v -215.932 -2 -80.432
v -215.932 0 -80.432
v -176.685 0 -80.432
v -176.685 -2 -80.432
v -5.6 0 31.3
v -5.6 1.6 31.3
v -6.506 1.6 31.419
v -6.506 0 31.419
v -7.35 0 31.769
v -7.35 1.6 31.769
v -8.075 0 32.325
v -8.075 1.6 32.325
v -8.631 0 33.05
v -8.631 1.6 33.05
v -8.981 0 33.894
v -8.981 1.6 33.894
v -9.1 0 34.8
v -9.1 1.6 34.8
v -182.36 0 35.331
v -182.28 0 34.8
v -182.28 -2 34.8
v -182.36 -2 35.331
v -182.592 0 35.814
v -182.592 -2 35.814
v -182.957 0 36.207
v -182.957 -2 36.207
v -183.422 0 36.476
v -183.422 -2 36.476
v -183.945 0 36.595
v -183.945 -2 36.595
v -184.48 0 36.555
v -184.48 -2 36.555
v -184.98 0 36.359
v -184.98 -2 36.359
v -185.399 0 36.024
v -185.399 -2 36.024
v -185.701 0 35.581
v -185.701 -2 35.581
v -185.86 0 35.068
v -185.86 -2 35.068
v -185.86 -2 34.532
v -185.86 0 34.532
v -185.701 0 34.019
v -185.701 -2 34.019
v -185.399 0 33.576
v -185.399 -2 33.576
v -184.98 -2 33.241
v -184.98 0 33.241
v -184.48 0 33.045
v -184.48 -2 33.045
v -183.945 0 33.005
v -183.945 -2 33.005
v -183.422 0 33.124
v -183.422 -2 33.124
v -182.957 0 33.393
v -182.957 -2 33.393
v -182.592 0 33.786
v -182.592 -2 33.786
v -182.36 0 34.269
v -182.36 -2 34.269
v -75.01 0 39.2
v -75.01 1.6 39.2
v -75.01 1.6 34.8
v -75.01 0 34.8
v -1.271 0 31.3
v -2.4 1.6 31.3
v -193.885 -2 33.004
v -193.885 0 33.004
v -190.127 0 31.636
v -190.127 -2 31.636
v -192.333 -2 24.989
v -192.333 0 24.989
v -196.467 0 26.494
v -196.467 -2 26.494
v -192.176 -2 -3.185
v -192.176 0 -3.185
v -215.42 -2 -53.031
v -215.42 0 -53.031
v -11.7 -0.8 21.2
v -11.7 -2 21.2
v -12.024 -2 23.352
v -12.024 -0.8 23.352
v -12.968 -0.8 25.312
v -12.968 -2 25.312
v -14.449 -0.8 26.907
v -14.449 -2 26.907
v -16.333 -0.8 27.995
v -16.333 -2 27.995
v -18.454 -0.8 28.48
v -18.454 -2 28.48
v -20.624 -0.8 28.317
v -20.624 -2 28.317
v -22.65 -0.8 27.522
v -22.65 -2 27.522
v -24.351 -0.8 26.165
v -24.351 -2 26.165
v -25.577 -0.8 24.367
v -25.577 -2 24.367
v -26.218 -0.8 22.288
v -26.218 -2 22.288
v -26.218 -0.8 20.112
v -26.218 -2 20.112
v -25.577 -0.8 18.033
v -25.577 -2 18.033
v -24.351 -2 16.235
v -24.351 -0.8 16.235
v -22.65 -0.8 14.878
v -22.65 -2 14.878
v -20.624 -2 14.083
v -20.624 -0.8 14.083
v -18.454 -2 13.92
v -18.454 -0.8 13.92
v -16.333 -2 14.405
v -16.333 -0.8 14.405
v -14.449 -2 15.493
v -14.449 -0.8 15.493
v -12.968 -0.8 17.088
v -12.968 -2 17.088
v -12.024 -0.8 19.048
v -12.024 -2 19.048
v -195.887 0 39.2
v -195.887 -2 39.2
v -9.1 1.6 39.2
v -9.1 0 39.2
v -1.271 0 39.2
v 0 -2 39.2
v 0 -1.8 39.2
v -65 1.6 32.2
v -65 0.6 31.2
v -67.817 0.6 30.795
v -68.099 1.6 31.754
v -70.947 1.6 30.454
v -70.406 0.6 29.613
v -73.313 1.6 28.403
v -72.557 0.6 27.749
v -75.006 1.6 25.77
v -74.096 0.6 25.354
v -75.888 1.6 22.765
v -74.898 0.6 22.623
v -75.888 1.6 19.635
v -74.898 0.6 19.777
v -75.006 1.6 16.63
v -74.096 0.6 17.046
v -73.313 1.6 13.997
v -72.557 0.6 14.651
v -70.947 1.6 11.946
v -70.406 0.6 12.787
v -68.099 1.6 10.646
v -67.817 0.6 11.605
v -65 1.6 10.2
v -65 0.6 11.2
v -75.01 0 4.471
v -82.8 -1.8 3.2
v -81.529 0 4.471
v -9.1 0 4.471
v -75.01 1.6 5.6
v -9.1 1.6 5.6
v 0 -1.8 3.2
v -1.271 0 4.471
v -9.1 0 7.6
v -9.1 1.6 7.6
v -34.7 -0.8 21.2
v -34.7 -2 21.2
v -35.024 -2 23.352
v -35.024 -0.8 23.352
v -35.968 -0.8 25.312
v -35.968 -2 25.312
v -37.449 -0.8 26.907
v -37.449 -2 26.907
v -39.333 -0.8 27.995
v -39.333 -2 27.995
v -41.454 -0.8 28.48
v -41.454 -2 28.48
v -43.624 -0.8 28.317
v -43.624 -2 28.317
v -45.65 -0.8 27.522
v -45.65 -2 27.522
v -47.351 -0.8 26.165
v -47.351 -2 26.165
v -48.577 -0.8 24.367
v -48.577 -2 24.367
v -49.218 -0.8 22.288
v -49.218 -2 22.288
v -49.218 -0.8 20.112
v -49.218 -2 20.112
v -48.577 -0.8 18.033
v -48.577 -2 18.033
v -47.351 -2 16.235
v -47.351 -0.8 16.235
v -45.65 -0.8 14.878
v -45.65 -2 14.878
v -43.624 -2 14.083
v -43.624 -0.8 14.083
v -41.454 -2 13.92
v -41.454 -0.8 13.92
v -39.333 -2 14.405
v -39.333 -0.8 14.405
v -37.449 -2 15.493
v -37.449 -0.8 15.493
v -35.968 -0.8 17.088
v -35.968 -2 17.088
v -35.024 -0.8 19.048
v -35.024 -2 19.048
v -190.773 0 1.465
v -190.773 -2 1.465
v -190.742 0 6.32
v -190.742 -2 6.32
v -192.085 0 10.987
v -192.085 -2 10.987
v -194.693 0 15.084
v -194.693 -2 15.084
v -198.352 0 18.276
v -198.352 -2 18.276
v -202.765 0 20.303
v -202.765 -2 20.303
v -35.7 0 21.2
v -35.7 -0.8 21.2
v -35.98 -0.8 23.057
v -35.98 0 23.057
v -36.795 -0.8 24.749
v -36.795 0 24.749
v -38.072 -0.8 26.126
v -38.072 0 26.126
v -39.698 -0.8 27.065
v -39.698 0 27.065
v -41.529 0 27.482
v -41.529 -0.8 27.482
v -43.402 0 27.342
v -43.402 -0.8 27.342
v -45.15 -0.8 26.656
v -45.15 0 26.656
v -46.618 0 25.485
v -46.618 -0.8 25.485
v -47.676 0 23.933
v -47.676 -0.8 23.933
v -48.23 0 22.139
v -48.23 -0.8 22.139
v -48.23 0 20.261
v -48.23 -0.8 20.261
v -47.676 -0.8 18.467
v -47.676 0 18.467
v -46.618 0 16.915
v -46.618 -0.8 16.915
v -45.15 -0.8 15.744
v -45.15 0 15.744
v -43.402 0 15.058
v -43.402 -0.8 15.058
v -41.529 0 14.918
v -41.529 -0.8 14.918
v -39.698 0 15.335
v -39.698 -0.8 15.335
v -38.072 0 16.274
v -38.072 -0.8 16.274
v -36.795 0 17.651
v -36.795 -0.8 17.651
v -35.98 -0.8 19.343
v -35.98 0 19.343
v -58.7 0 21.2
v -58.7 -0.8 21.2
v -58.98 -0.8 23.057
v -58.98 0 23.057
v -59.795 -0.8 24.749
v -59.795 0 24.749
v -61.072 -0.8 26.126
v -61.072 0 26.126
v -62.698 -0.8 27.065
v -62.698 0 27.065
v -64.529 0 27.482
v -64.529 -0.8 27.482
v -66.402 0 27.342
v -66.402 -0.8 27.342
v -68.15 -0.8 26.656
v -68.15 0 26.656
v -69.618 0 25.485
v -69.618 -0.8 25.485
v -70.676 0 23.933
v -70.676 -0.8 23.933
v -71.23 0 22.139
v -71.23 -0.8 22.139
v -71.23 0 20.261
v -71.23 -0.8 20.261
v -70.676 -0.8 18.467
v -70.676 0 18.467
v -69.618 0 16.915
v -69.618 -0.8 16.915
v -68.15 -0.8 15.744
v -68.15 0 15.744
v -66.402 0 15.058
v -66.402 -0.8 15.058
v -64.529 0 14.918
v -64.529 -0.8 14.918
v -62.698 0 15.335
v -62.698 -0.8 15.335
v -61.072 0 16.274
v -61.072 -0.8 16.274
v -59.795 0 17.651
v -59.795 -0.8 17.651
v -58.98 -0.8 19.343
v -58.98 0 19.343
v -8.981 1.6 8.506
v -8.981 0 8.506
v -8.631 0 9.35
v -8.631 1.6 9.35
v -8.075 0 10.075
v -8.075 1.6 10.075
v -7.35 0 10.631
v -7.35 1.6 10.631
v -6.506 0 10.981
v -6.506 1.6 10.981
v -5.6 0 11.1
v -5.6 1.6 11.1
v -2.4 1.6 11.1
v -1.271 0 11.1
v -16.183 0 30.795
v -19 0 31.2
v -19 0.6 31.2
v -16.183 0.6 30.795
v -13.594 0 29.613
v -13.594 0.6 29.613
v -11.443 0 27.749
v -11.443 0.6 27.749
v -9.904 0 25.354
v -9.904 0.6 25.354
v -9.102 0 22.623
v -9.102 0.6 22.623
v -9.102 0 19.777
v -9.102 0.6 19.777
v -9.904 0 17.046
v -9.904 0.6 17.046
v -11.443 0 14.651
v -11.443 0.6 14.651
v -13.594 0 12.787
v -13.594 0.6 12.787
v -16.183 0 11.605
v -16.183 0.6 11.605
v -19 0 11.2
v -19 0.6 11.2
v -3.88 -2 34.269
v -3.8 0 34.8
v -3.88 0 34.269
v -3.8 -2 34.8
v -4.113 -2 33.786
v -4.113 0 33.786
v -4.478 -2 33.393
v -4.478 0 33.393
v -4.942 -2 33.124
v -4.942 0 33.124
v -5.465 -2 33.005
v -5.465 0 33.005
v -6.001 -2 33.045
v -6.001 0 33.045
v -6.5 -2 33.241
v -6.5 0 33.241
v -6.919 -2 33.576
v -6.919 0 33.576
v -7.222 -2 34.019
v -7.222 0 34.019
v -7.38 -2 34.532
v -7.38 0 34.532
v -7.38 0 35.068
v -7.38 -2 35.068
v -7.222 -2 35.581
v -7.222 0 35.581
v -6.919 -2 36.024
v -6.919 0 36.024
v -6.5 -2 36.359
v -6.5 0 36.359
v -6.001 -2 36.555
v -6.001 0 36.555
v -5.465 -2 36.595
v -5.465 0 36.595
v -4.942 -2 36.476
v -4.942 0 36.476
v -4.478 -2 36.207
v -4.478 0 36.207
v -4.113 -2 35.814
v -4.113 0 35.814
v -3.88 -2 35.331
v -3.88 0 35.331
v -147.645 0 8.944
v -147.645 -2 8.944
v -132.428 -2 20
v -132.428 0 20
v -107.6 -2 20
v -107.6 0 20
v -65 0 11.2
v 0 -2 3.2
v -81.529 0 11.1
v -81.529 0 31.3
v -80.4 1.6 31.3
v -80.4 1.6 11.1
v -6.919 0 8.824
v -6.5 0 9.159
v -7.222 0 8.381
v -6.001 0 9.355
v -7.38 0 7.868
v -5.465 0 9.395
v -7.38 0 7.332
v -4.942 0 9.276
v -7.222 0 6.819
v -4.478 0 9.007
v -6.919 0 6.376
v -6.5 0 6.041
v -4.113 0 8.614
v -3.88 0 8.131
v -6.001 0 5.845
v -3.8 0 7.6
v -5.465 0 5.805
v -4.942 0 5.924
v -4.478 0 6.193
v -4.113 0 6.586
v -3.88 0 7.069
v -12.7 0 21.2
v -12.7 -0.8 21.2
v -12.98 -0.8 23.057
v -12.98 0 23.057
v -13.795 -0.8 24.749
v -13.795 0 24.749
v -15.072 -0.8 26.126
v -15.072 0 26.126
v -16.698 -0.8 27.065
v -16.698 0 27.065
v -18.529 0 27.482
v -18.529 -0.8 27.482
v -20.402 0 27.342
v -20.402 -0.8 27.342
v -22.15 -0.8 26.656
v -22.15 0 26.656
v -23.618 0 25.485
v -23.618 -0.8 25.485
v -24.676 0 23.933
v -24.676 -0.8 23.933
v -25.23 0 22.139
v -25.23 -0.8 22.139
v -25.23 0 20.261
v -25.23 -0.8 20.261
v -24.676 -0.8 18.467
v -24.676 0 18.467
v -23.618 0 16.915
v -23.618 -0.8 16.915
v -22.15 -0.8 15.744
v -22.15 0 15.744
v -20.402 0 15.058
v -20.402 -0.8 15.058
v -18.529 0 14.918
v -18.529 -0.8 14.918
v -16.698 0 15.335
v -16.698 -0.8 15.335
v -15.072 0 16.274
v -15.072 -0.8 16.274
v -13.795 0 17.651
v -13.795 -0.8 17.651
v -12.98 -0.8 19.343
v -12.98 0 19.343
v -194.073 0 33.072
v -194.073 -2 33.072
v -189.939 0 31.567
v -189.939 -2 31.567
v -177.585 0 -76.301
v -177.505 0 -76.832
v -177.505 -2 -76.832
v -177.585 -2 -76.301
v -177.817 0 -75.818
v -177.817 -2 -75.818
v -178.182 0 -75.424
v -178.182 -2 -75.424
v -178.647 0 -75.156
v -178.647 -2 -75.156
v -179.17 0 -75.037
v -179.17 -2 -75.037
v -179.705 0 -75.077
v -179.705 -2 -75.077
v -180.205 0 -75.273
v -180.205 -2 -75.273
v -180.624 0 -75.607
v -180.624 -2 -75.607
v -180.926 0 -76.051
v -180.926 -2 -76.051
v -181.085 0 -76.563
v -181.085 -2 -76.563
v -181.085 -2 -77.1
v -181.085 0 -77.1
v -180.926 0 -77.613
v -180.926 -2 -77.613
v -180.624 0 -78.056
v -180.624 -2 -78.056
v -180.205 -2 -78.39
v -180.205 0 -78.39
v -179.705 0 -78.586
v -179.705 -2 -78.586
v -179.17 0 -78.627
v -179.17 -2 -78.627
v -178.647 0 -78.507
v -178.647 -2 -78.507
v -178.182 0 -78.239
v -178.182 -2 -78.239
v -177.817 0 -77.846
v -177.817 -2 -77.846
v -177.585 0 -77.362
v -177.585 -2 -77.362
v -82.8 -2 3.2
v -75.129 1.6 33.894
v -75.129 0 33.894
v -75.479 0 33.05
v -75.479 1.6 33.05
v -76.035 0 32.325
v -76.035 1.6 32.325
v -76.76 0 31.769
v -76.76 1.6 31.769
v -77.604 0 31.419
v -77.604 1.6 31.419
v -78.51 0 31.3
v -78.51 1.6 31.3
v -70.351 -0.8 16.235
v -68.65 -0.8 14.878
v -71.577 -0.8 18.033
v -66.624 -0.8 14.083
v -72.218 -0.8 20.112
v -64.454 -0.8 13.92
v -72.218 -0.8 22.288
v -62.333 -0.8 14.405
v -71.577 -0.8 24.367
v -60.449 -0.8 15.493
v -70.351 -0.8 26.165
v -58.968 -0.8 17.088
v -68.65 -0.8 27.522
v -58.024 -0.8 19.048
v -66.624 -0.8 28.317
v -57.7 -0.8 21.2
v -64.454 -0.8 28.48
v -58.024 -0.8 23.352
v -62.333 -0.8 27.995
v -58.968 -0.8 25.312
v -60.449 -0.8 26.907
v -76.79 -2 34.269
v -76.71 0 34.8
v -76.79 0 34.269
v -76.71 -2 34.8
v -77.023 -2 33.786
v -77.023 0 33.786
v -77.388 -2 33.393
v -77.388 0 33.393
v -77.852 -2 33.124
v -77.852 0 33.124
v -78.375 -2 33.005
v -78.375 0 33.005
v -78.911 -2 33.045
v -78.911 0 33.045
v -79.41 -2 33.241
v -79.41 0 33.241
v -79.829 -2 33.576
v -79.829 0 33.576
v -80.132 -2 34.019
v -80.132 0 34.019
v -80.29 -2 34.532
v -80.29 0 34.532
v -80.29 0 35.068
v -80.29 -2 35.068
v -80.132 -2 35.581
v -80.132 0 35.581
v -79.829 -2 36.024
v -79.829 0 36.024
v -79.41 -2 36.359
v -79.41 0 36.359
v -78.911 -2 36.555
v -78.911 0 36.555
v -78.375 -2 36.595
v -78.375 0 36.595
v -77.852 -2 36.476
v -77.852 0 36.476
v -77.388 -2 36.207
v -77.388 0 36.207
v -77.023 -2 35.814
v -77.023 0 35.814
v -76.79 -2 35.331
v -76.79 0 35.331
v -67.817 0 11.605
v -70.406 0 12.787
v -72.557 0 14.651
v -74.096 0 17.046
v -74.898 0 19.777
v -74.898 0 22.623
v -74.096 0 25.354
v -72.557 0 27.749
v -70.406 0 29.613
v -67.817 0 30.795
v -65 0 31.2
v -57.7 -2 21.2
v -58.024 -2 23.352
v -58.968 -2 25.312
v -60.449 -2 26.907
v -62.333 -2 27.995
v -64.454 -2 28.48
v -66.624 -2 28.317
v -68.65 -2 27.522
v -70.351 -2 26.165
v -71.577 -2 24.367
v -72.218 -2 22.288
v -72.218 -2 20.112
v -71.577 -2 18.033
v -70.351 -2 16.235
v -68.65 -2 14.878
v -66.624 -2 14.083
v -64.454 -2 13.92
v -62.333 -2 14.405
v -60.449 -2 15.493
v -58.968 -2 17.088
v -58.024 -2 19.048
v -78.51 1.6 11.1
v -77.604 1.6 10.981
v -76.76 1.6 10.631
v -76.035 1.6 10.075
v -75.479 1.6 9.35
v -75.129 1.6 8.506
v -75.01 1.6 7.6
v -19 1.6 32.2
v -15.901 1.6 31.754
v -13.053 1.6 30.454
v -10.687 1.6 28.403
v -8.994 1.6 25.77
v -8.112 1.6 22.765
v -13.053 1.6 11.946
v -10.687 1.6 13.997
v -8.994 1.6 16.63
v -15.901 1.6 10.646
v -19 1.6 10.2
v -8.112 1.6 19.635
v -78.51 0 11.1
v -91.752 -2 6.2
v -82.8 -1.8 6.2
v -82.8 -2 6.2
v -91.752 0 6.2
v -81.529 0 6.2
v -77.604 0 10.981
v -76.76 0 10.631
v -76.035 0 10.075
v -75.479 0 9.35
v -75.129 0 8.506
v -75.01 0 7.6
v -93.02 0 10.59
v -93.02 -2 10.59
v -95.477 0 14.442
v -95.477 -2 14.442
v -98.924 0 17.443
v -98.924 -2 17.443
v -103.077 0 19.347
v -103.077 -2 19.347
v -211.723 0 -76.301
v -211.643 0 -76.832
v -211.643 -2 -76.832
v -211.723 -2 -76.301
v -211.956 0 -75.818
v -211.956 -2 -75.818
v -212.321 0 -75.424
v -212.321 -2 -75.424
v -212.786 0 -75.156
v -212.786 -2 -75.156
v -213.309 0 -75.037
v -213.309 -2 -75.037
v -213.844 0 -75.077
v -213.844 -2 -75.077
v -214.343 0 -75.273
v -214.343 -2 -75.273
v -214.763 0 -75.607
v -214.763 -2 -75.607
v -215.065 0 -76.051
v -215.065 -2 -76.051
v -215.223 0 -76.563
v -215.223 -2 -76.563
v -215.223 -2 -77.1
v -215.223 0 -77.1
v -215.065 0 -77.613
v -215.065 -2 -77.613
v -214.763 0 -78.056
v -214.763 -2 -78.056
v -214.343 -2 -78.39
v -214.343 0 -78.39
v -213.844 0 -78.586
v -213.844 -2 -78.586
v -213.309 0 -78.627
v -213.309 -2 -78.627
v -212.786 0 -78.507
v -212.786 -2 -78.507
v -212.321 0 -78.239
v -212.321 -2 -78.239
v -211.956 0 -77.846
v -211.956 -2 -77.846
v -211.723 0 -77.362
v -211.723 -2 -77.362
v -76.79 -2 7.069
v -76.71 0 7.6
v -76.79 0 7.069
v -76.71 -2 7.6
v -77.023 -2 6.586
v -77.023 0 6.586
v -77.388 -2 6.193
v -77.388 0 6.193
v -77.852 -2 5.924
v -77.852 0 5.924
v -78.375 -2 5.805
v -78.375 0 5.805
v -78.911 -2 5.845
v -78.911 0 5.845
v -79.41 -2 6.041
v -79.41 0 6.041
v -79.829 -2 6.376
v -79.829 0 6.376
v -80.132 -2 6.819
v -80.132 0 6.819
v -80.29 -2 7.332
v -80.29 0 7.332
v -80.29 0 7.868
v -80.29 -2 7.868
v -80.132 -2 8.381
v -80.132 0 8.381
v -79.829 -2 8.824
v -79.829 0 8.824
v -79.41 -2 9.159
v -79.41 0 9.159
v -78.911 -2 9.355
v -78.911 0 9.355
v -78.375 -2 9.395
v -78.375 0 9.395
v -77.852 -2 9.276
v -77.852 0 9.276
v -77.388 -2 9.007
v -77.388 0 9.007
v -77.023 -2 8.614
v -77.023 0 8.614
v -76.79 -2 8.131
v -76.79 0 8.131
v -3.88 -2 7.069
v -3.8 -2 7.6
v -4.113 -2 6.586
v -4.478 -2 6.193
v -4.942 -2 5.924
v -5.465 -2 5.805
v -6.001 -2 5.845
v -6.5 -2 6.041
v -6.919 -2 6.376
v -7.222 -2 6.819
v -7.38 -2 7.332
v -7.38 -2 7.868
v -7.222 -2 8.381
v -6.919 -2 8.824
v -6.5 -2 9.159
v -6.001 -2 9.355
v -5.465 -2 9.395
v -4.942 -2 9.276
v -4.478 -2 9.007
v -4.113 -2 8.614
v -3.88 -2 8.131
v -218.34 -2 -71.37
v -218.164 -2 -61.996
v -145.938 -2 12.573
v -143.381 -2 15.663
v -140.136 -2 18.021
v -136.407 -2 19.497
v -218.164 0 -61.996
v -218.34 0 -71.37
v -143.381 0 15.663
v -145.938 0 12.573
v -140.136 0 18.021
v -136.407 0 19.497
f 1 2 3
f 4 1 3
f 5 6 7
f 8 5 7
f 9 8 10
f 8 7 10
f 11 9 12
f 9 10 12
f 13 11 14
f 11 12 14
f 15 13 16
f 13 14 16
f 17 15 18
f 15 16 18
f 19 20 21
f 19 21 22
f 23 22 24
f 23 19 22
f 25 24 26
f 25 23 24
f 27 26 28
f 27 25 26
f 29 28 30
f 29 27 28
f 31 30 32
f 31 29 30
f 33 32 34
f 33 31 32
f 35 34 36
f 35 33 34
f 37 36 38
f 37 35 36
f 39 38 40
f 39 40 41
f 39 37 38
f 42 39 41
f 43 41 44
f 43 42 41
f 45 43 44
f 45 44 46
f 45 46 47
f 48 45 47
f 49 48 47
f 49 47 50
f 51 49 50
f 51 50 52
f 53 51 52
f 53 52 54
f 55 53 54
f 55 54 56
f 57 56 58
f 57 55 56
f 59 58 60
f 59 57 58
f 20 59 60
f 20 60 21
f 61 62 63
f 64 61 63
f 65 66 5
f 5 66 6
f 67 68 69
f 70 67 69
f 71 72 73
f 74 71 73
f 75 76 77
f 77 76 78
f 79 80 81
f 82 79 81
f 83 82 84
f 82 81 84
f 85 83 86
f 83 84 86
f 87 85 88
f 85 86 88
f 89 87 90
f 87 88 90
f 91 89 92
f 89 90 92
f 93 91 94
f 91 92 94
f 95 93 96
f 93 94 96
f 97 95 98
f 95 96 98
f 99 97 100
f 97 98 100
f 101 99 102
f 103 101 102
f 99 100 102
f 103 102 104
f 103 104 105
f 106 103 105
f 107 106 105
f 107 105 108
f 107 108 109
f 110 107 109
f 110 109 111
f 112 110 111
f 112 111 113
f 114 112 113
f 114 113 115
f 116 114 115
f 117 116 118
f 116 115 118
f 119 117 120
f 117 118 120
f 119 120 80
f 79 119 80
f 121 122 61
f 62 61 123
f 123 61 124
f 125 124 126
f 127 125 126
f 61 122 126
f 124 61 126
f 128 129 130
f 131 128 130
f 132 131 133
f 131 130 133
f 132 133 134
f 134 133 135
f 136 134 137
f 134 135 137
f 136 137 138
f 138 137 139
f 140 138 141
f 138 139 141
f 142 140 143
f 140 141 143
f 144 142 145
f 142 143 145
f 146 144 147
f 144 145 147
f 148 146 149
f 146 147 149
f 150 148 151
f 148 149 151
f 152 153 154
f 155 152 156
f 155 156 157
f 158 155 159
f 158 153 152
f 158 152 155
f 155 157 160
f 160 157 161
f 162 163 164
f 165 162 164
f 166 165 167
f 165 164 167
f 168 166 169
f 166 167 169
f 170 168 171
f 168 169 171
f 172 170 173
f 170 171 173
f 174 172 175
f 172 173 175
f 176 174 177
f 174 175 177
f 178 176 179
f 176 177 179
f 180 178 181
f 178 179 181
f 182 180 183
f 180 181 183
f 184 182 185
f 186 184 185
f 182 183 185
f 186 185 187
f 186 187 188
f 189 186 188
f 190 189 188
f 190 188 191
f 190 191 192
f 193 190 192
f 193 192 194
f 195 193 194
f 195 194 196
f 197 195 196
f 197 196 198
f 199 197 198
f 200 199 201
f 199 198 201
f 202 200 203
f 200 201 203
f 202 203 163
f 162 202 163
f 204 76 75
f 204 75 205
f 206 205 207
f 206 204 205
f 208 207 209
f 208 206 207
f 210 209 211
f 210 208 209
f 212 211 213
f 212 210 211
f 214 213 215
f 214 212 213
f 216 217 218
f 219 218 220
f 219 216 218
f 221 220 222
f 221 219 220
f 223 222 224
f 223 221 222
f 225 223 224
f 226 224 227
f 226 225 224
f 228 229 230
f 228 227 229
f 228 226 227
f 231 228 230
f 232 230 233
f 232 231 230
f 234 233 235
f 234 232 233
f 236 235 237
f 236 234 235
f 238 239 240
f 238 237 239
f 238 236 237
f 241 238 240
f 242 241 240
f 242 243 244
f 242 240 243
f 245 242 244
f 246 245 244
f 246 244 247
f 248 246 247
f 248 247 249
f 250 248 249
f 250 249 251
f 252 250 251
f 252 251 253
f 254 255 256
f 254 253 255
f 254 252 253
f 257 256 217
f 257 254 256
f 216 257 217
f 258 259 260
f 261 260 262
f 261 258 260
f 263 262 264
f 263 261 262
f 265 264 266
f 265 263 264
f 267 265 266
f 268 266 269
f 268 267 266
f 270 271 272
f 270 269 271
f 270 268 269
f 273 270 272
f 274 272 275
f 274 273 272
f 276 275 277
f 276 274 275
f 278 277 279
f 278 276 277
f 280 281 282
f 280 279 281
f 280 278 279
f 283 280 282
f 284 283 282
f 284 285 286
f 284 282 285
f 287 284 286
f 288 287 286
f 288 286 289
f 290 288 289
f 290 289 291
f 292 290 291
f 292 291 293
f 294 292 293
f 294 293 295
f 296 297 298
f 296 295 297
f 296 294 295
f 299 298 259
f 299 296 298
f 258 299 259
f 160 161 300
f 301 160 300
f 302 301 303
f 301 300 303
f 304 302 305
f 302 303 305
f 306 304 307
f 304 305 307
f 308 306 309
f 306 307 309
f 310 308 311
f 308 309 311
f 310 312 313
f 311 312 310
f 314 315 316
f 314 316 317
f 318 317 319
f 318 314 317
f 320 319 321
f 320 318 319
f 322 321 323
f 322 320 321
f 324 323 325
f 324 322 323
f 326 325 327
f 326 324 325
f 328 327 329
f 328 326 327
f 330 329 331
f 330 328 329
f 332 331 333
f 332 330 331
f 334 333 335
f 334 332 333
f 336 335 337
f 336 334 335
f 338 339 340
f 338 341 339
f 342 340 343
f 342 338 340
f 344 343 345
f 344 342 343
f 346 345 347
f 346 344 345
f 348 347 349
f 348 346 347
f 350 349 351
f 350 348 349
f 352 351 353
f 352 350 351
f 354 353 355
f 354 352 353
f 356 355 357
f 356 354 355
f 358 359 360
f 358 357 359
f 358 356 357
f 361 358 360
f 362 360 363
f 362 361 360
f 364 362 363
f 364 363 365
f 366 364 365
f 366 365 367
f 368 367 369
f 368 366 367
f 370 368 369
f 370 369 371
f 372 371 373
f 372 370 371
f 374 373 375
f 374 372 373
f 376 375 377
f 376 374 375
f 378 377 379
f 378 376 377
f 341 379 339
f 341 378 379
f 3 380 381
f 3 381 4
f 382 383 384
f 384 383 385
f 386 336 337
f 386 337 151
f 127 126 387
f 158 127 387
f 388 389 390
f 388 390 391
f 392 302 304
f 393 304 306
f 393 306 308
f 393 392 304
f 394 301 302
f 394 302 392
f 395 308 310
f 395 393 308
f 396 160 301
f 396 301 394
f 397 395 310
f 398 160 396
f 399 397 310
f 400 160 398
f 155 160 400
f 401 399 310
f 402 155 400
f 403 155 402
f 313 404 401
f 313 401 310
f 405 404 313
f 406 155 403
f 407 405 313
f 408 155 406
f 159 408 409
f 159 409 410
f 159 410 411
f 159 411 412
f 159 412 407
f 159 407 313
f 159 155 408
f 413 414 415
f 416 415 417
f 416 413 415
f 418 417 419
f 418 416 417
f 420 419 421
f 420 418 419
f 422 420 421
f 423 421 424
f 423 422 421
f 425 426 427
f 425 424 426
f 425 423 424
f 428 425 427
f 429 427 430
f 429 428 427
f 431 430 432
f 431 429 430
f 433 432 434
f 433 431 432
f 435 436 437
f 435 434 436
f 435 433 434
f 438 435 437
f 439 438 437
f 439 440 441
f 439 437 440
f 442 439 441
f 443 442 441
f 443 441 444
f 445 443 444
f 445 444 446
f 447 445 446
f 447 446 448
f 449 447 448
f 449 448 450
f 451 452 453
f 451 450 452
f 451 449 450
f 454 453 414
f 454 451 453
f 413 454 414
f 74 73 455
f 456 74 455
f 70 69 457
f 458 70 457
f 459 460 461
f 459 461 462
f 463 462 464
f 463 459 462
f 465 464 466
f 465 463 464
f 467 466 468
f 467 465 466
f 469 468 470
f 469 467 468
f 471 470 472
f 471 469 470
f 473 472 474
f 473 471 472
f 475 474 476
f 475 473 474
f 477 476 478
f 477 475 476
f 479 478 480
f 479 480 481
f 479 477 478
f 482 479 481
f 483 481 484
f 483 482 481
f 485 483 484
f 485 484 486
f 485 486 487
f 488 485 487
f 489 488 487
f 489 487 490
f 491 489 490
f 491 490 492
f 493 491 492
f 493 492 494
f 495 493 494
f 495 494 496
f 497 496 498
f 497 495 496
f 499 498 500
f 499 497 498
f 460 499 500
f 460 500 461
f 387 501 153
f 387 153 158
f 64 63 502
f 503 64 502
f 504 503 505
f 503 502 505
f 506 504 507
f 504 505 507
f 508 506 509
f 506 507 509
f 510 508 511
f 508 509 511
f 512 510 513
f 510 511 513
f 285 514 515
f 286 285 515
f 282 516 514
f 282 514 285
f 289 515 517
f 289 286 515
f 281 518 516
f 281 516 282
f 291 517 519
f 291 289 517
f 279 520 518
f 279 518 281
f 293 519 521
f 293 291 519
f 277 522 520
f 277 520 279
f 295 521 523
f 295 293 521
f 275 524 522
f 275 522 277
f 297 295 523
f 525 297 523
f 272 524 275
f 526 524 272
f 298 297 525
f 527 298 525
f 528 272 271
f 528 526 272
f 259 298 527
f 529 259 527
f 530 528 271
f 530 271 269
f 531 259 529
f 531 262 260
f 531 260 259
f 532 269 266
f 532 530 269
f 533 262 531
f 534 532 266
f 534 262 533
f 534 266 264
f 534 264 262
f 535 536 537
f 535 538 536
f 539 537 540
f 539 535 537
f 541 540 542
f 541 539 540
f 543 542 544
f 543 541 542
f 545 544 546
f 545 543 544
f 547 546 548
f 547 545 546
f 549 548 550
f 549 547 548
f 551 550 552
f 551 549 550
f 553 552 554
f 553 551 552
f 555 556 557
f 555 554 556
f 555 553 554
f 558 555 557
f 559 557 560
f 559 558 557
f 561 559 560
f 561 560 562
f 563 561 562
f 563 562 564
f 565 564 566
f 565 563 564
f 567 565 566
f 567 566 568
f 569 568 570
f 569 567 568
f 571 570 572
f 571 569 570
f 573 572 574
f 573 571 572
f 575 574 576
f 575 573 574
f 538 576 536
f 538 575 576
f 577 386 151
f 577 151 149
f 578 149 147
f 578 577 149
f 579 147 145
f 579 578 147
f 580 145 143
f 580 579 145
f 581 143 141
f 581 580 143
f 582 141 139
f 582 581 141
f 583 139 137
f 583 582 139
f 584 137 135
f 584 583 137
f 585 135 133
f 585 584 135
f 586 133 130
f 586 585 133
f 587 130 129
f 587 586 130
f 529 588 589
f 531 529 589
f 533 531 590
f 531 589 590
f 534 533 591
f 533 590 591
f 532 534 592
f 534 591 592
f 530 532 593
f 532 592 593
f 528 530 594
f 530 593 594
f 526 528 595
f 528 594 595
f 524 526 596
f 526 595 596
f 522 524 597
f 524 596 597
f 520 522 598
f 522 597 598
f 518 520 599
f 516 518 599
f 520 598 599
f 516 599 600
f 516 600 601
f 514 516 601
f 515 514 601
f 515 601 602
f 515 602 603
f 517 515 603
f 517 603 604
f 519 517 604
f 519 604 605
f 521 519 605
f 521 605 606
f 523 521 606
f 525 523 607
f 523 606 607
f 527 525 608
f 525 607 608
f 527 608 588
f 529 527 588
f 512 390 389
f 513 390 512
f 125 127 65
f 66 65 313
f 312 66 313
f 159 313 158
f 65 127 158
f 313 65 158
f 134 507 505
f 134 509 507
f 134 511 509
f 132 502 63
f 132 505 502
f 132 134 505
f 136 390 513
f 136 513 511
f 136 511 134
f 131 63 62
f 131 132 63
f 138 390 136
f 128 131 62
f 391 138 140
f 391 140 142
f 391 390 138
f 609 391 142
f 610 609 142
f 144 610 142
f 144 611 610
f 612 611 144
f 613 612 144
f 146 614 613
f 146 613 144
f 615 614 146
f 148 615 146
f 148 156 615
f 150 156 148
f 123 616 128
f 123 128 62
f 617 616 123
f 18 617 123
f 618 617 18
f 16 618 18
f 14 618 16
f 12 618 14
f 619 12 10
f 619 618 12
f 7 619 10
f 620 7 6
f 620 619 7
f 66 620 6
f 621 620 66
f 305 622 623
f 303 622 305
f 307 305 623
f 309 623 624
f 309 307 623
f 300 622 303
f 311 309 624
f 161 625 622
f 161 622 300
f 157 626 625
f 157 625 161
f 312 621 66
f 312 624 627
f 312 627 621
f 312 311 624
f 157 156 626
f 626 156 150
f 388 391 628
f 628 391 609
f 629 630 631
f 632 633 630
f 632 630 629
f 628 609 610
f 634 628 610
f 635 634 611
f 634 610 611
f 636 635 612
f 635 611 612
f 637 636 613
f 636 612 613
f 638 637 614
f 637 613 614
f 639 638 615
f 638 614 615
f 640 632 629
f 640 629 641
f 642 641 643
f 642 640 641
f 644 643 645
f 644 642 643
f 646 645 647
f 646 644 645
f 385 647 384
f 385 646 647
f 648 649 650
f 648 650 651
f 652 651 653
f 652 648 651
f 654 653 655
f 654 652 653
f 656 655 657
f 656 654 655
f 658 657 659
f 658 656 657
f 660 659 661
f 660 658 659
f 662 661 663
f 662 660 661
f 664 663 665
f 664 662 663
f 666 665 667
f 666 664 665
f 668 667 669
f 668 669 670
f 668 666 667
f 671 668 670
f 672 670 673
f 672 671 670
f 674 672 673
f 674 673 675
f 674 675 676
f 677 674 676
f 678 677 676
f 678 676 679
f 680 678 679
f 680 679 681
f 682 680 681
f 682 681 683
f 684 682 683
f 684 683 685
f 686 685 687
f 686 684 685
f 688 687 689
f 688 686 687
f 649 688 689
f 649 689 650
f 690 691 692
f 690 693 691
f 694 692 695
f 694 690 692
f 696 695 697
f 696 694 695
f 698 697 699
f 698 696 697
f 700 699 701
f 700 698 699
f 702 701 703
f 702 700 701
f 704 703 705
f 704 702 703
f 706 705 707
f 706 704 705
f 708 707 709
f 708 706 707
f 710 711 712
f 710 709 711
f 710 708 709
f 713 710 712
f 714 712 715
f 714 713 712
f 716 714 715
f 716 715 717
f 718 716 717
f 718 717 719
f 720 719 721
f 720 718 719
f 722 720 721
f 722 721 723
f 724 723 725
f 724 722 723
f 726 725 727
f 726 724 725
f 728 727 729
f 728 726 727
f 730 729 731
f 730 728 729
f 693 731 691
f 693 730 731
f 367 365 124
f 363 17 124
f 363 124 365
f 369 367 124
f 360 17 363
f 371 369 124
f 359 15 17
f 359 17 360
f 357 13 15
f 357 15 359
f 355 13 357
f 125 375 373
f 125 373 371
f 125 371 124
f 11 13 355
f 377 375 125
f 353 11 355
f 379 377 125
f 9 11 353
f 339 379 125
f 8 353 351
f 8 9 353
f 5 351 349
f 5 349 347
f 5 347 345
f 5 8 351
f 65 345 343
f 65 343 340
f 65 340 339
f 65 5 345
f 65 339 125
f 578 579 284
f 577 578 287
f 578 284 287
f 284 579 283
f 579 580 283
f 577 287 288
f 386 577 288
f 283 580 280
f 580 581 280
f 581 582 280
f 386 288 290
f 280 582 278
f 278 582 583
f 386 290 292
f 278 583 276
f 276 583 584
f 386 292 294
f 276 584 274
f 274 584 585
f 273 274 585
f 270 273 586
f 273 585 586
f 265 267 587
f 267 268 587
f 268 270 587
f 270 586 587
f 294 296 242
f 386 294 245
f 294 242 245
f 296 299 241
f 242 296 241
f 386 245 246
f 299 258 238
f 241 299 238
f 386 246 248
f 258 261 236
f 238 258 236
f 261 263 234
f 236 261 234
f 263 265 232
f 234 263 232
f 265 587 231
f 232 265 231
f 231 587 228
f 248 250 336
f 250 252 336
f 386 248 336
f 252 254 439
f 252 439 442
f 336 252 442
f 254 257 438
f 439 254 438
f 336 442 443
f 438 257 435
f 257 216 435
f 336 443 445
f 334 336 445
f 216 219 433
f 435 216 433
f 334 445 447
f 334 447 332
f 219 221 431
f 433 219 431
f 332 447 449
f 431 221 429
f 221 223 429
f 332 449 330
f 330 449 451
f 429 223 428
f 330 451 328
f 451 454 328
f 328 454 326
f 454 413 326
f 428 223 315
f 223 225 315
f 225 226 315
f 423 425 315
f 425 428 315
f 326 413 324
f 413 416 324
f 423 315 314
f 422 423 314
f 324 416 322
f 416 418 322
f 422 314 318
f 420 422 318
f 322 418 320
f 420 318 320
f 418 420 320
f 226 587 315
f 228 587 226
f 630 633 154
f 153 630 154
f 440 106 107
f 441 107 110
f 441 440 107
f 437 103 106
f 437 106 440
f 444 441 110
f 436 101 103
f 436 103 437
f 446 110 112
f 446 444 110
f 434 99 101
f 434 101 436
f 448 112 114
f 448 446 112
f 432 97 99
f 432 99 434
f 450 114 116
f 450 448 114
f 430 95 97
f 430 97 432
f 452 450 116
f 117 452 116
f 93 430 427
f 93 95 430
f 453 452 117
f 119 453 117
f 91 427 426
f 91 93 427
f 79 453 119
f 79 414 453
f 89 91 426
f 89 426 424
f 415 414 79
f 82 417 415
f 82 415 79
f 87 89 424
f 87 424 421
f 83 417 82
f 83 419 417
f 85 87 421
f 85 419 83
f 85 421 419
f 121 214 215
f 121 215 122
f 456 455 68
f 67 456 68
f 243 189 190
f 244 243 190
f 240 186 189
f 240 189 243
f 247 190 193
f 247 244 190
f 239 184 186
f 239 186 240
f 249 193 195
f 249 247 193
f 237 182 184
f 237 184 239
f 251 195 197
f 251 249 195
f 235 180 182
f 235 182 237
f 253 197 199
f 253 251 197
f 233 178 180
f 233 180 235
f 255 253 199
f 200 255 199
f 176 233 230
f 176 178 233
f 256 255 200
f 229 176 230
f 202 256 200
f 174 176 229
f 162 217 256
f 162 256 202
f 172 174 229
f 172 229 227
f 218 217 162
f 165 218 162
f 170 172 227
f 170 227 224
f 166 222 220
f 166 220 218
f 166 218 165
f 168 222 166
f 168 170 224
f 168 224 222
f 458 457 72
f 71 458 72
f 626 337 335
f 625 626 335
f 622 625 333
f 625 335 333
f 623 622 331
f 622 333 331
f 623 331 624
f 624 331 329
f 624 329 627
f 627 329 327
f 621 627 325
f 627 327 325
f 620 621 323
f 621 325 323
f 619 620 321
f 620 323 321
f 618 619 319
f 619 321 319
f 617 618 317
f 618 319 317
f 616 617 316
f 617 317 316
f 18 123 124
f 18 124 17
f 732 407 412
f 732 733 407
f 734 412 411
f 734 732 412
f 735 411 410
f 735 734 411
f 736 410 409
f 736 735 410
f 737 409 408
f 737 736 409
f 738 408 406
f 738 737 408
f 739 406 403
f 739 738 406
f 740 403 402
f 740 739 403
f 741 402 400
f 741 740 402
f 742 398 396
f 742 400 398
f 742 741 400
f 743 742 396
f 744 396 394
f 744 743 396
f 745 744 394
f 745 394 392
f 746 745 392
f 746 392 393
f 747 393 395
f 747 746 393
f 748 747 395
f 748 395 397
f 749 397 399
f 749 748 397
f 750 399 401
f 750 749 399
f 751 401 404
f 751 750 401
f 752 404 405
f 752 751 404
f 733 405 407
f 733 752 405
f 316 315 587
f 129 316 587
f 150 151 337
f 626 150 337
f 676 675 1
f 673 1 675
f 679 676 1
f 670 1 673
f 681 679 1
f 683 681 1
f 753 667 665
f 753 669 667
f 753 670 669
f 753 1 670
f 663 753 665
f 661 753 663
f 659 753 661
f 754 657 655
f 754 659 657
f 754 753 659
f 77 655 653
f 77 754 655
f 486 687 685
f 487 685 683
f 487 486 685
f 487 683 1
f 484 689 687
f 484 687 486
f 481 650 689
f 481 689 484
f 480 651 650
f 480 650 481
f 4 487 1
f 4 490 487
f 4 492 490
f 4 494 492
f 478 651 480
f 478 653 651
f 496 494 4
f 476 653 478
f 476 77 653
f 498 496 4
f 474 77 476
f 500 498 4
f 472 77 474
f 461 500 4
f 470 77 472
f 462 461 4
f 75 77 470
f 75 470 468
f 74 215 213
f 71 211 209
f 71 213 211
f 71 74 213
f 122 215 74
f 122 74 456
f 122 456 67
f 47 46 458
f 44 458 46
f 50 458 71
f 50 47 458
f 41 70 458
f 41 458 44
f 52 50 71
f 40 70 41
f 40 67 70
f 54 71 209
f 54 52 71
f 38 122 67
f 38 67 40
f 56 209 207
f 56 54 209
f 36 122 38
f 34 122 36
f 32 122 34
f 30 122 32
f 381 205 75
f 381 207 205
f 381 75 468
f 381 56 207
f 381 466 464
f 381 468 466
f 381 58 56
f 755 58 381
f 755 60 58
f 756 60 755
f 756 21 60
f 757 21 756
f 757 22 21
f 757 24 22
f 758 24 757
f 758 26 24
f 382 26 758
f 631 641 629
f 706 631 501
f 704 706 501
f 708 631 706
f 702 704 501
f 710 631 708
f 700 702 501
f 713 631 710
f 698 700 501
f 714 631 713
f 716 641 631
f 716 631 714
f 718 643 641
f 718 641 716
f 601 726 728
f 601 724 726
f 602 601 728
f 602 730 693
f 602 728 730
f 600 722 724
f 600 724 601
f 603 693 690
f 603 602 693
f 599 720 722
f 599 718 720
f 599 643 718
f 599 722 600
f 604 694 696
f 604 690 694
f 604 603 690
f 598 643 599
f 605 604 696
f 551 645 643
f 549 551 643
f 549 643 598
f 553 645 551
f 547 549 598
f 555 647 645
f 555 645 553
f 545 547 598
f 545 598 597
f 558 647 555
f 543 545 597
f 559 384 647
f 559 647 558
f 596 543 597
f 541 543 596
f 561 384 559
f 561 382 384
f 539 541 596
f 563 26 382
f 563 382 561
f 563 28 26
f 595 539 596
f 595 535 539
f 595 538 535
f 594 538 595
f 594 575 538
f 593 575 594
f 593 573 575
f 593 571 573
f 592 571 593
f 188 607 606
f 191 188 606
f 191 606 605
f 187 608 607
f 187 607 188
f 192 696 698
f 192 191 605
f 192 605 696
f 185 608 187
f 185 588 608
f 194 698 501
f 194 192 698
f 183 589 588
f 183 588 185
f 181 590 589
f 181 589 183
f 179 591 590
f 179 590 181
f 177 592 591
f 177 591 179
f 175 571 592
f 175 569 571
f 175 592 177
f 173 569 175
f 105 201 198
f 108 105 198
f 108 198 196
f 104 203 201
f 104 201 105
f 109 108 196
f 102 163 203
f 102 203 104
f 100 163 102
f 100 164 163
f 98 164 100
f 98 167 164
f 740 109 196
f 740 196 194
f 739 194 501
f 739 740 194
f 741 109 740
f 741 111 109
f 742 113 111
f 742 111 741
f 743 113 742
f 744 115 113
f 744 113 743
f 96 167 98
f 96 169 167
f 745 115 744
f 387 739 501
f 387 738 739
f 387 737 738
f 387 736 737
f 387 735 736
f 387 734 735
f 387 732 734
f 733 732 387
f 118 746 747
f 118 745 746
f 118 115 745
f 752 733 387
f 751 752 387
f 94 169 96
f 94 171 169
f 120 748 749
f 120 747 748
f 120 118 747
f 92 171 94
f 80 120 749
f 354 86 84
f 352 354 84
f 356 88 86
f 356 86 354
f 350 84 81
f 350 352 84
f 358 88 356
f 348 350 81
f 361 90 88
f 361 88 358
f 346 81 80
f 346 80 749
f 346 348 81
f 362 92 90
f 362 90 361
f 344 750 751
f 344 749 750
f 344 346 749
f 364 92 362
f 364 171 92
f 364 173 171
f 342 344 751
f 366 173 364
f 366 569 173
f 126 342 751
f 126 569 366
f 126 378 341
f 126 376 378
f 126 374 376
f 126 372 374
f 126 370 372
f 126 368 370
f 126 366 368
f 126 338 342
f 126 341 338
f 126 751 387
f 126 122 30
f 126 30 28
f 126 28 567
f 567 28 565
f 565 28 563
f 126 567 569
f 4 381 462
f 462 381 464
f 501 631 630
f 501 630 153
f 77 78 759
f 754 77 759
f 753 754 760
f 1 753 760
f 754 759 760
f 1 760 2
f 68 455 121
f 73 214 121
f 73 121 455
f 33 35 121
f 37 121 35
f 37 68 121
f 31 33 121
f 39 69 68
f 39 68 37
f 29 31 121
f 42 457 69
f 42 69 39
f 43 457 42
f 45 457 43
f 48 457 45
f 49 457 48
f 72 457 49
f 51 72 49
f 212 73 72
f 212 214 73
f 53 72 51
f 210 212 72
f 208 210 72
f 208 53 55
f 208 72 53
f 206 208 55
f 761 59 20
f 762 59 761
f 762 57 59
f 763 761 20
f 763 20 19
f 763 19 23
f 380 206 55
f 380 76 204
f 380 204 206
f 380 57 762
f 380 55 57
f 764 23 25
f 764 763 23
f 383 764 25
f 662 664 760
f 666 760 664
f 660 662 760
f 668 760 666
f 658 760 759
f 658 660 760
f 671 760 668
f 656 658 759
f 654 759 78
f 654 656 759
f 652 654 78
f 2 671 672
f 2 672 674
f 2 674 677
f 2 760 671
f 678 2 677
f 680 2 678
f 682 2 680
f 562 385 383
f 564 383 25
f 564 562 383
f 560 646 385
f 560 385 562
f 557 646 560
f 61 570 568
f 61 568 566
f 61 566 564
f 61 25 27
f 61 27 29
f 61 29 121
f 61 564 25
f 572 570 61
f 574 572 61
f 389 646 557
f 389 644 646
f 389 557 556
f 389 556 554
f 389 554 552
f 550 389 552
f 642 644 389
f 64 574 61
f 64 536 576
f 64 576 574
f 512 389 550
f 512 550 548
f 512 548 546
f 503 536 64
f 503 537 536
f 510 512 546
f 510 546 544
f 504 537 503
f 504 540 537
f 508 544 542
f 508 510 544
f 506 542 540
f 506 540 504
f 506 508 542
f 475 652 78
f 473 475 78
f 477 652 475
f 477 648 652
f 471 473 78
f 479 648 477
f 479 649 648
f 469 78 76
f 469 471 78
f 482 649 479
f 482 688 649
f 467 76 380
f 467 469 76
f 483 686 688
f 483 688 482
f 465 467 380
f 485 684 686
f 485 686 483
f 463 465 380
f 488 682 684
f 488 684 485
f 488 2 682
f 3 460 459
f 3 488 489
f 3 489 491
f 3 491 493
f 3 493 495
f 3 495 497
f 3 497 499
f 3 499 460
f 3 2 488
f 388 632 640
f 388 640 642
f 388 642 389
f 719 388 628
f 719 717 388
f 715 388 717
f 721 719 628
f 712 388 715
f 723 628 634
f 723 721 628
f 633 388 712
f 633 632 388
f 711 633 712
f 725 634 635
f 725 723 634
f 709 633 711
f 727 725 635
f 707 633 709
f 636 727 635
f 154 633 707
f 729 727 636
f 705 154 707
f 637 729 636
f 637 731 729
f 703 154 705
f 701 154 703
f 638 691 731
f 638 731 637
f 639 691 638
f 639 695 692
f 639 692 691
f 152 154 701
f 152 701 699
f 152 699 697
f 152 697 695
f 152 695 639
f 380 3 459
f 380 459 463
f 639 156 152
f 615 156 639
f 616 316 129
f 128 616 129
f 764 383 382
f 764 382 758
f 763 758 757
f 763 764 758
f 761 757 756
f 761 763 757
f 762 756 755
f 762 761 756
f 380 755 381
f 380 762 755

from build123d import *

# Parameters (mm, degrees)
SKETCH074_R      = 1.8
SKETCH074_R_2    = 6.3
PAD004_DEPTH     = 2
SKETCH091_R      = 7.3
POCKET001_DEPTH  = 1.2
SKETCH092_W      = 82.8
SKETCH092_H      = 36
SKETCH092_R      = 1.8
PAD005_DEPTH     = 1.6
CHAMFER001_SIZE2 = 3.4
CHAMFER001_SIZE  = 2.4
POCKET002_DEPTH  = 1.6
CHAMFER002_SIZE  = 1


with BuildPart() as part:
    # Sketch074 → Pad004 (new body)
    with BuildSketch(Plane.XZ):
        with BuildLine():
            Line((-82.8, 3.2), (0, 3.2))
            Line((0, 3.2), (0, 39.2))
            Line((-195.886839, 39.2), (0, 39.2))
            Line((-202.764796, 20.302968), (-195.886839, 39.2))
            ThreePointArc((-192.175575, -3.18451), (-192.085048, 10.987093), (-202.764796, 20.302968))
            Line((-192.175575, -3.18451), (-215.419579, -53.031439))
            ThreePointArc((-215.419579, -53.031439), (-218.578907, -66.677212), (-215.93199, -80.431568))
            Line((-215.93199, -80.431568), (-176.68528, -80.431568))
            Line((-147.645309, 8.944272), (-176.68528, -80.431568))
            ThreePointArc((-132.428405, 20), (-141.832969, 16.944272), (-147.645309, 8.944272))
            Line((-132.428405, 20), (-107.6, 20))
            ThreePointArc((-91.751972, 6.2), (-97.09286, 16.066483), (-107.6, 20))
            Line((-82.8, 6.2), (-91.751972, 6.2))
            Line((-82.8, 3.2), (-82.8, 6.2))
        make_face()
        with Locations((-213.443268, -76.831568)):
            Circle(SKETCH074_R, mode=Mode.SUBTRACT)
        with Locations((-179.304663, -76.831568)):
            Circle(SKETCH074_R, mode=Mode.SUBTRACT)
        with Locations((-184.079668, 34.8)):
            Circle(SKETCH074_R, mode=Mode.SUBTRACT)
        with Locations((-78.51, 34.8)):
            Circle(SKETCH074_R, mode=Mode.SUBTRACT)
        with Locations((-78.51, 7.6)):
            Circle(SKETCH074_R, mode=Mode.SUBTRACT)
        with Locations((-5.6, 34.8)):
            Circle(SKETCH074_R, mode=Mode.SUBTRACT)
        with Locations((-5.6, 7.6)):
            Circle(SKETCH074_R, mode=Mode.SUBTRACT)
        with Locations((-19, 21.2)):
            Circle(SKETCH074_R_2, mode=Mode.SUBTRACT)
        with Locations((-42, 21.2)):
            Circle(SKETCH074_R_2, mode=Mode.SUBTRACT)
        with Locations((-65, 21.2)):
            Circle(SKETCH074_R_2, mode=Mode.SUBTRACT)
        Polygon((-189.938695, 31.567195), (-192.332836, 24.989347), (-196.467483, 26.494236), (-194.073342, 33.072084), (-193.885404, 33.00368), (-190.126633, 31.635599), align=None, mode=Mode.SUBTRACT)
    extrude(amount=PAD004_DEPTH)

    # Sketch091 (on Face29 of Pad004) → Pocket001 (cut)
    with BuildSketch(Plane.XZ.offset(2)):
        with Locations((-65, 21.2)):
            Circle(SKETCH091_R)
        with Locations((-42, 21.2)):
            Circle(SKETCH091_R)
        with Locations((-19, 21.2)):
            Circle(SKETCH091_R)
    extrude(amount=-POCKET001_DEPTH, mode=Mode.SUBTRACT)

    # Sketch092 (on Face4 of Pocket001) → Pad005 (join)
    with BuildSketch(Plane(origin=(0, 0, 0), x_dir=(1, 0, 0), z_dir=(0, 1, 0))):
        with Locations((-41.4, -21.2)):
            Rectangle(SKETCH092_W, SKETCH092_H)
        with Locations((-5.6, -34.8)):
            Circle(SKETCH092_R, mode=Mode.SUBTRACT)
        with Locations((-5.6, -7.6)):
            Circle(SKETCH092_R, mode=Mode.SUBTRACT)
        with Locations((-78.51, -34.8)):
            Circle(SKETCH092_R, mode=Mode.SUBTRACT)
        with Locations((-78.51, -7.6)):
            Circle(SKETCH092_R, mode=Mode.SUBTRACT)
        with BuildLine():
            ThreePointArc((-19, -31.2), (-9, -21.2), (-19, -11.2))
            Line((-19, -11.2), (-65, -11.2))
            ThreePointArc((-65, -11.2), (-75, -21.2), (-65, -31.2))
            Line((-19, -31.2), (-65, -31.2))
        make_face(mode=Mode.SUBTRACT)
    extrude(amount=PAD005_DEPTH)

    # Chamfer001
    chamfer001_edges = [part.edges().sort_by_distance(p)[0] for p in [
        (0, 1.6, 21.2),
        (-41.4, 1.6, 3.2),
        (-82.8, 1.6, 21.2),
    ]]
    chamfer001_side = part.faces().sort_by_distance((-41.4, 1.6, 4.102875))[0]
    chamfer(chamfer001_edges, length=CHAMFER001_SIZE, length2=CHAMFER001_SIZE2, reference=chamfer001_side)

    # Sketch093 (on Face1 of Chamfer001) → Pocket002 (cut)
    with BuildSketch(Plane(origin=(0, 1.6, 0), x_dir=(1, 0, 0), z_dir=(0, 1, 0))):
        with BuildLine():
            ThreePointArc((-5.6, -31.3), (-8.074874, -32.325126), (-9.1, -34.8))
            Line((-9.1, -39.2), (-9.1, -34.8))
            Line((0, -39.2), (-9.1, -39.2))
            Line((0, -39.2), (0, -31.3))
            Line((0, -31.3), (-5.6, -31.3))
        make_face()
        with BuildLine():
            ThreePointArc((-75.01, -34.8), (-76.035126, -32.325126), (-78.51, -31.3))
            Line((-82.8, -31.3), (-78.51, -31.3))
            Line((-82.8, -39.2), (-82.8, -31.3))
            Line((-82.8, -39.2), (-75.01, -39.2))
            Line((-75.01, -39.2), (-75.01, -34.8))
        make_face()
        with BuildLine():
            ThreePointArc((-9.1, -7.6), (-8.074874, -10.074874), (-5.6, -11.1))
            Line((0, -11.1), (-5.6, -11.1))
            Line((0, -3.2), (0, -11.1))
            Line((0, -3.2), (-9.1, -3.2))
            Line((-9.1, -3.2), (-9.1, -7.6))
        make_face()
        with BuildLine():
            ThreePointArc((-78.51, -11.1), (-76.035126, -10.074874), (-75.01, -7.6))
            Line((-75.01, -3.2), (-75.01, -7.6))
            Line((-82.8, -3.2), (-75.01, -3.2))
            Line((-82.8, -3.2), (-82.8, -11.1))
            Line((-82.8, -11.1), (-78.51, -11.1))
        make_face()
    extrude(amount=-POCKET002_DEPTH, mode=Mode.SUBTRACT)

    # Chamfer002
    chamfer002_edges = [part.edges().sort_by_distance(p)[0] for p in [
        (-42, 1.6, 31.2),
        (-9, 1.6, 21.2),
        (-42, 1.6, 11.2),
        (-75, 1.6, 21.2),
    ]]
    chamfer(chamfer002_edges, length=CHAMFER002_SIZE)


solid = part.part
